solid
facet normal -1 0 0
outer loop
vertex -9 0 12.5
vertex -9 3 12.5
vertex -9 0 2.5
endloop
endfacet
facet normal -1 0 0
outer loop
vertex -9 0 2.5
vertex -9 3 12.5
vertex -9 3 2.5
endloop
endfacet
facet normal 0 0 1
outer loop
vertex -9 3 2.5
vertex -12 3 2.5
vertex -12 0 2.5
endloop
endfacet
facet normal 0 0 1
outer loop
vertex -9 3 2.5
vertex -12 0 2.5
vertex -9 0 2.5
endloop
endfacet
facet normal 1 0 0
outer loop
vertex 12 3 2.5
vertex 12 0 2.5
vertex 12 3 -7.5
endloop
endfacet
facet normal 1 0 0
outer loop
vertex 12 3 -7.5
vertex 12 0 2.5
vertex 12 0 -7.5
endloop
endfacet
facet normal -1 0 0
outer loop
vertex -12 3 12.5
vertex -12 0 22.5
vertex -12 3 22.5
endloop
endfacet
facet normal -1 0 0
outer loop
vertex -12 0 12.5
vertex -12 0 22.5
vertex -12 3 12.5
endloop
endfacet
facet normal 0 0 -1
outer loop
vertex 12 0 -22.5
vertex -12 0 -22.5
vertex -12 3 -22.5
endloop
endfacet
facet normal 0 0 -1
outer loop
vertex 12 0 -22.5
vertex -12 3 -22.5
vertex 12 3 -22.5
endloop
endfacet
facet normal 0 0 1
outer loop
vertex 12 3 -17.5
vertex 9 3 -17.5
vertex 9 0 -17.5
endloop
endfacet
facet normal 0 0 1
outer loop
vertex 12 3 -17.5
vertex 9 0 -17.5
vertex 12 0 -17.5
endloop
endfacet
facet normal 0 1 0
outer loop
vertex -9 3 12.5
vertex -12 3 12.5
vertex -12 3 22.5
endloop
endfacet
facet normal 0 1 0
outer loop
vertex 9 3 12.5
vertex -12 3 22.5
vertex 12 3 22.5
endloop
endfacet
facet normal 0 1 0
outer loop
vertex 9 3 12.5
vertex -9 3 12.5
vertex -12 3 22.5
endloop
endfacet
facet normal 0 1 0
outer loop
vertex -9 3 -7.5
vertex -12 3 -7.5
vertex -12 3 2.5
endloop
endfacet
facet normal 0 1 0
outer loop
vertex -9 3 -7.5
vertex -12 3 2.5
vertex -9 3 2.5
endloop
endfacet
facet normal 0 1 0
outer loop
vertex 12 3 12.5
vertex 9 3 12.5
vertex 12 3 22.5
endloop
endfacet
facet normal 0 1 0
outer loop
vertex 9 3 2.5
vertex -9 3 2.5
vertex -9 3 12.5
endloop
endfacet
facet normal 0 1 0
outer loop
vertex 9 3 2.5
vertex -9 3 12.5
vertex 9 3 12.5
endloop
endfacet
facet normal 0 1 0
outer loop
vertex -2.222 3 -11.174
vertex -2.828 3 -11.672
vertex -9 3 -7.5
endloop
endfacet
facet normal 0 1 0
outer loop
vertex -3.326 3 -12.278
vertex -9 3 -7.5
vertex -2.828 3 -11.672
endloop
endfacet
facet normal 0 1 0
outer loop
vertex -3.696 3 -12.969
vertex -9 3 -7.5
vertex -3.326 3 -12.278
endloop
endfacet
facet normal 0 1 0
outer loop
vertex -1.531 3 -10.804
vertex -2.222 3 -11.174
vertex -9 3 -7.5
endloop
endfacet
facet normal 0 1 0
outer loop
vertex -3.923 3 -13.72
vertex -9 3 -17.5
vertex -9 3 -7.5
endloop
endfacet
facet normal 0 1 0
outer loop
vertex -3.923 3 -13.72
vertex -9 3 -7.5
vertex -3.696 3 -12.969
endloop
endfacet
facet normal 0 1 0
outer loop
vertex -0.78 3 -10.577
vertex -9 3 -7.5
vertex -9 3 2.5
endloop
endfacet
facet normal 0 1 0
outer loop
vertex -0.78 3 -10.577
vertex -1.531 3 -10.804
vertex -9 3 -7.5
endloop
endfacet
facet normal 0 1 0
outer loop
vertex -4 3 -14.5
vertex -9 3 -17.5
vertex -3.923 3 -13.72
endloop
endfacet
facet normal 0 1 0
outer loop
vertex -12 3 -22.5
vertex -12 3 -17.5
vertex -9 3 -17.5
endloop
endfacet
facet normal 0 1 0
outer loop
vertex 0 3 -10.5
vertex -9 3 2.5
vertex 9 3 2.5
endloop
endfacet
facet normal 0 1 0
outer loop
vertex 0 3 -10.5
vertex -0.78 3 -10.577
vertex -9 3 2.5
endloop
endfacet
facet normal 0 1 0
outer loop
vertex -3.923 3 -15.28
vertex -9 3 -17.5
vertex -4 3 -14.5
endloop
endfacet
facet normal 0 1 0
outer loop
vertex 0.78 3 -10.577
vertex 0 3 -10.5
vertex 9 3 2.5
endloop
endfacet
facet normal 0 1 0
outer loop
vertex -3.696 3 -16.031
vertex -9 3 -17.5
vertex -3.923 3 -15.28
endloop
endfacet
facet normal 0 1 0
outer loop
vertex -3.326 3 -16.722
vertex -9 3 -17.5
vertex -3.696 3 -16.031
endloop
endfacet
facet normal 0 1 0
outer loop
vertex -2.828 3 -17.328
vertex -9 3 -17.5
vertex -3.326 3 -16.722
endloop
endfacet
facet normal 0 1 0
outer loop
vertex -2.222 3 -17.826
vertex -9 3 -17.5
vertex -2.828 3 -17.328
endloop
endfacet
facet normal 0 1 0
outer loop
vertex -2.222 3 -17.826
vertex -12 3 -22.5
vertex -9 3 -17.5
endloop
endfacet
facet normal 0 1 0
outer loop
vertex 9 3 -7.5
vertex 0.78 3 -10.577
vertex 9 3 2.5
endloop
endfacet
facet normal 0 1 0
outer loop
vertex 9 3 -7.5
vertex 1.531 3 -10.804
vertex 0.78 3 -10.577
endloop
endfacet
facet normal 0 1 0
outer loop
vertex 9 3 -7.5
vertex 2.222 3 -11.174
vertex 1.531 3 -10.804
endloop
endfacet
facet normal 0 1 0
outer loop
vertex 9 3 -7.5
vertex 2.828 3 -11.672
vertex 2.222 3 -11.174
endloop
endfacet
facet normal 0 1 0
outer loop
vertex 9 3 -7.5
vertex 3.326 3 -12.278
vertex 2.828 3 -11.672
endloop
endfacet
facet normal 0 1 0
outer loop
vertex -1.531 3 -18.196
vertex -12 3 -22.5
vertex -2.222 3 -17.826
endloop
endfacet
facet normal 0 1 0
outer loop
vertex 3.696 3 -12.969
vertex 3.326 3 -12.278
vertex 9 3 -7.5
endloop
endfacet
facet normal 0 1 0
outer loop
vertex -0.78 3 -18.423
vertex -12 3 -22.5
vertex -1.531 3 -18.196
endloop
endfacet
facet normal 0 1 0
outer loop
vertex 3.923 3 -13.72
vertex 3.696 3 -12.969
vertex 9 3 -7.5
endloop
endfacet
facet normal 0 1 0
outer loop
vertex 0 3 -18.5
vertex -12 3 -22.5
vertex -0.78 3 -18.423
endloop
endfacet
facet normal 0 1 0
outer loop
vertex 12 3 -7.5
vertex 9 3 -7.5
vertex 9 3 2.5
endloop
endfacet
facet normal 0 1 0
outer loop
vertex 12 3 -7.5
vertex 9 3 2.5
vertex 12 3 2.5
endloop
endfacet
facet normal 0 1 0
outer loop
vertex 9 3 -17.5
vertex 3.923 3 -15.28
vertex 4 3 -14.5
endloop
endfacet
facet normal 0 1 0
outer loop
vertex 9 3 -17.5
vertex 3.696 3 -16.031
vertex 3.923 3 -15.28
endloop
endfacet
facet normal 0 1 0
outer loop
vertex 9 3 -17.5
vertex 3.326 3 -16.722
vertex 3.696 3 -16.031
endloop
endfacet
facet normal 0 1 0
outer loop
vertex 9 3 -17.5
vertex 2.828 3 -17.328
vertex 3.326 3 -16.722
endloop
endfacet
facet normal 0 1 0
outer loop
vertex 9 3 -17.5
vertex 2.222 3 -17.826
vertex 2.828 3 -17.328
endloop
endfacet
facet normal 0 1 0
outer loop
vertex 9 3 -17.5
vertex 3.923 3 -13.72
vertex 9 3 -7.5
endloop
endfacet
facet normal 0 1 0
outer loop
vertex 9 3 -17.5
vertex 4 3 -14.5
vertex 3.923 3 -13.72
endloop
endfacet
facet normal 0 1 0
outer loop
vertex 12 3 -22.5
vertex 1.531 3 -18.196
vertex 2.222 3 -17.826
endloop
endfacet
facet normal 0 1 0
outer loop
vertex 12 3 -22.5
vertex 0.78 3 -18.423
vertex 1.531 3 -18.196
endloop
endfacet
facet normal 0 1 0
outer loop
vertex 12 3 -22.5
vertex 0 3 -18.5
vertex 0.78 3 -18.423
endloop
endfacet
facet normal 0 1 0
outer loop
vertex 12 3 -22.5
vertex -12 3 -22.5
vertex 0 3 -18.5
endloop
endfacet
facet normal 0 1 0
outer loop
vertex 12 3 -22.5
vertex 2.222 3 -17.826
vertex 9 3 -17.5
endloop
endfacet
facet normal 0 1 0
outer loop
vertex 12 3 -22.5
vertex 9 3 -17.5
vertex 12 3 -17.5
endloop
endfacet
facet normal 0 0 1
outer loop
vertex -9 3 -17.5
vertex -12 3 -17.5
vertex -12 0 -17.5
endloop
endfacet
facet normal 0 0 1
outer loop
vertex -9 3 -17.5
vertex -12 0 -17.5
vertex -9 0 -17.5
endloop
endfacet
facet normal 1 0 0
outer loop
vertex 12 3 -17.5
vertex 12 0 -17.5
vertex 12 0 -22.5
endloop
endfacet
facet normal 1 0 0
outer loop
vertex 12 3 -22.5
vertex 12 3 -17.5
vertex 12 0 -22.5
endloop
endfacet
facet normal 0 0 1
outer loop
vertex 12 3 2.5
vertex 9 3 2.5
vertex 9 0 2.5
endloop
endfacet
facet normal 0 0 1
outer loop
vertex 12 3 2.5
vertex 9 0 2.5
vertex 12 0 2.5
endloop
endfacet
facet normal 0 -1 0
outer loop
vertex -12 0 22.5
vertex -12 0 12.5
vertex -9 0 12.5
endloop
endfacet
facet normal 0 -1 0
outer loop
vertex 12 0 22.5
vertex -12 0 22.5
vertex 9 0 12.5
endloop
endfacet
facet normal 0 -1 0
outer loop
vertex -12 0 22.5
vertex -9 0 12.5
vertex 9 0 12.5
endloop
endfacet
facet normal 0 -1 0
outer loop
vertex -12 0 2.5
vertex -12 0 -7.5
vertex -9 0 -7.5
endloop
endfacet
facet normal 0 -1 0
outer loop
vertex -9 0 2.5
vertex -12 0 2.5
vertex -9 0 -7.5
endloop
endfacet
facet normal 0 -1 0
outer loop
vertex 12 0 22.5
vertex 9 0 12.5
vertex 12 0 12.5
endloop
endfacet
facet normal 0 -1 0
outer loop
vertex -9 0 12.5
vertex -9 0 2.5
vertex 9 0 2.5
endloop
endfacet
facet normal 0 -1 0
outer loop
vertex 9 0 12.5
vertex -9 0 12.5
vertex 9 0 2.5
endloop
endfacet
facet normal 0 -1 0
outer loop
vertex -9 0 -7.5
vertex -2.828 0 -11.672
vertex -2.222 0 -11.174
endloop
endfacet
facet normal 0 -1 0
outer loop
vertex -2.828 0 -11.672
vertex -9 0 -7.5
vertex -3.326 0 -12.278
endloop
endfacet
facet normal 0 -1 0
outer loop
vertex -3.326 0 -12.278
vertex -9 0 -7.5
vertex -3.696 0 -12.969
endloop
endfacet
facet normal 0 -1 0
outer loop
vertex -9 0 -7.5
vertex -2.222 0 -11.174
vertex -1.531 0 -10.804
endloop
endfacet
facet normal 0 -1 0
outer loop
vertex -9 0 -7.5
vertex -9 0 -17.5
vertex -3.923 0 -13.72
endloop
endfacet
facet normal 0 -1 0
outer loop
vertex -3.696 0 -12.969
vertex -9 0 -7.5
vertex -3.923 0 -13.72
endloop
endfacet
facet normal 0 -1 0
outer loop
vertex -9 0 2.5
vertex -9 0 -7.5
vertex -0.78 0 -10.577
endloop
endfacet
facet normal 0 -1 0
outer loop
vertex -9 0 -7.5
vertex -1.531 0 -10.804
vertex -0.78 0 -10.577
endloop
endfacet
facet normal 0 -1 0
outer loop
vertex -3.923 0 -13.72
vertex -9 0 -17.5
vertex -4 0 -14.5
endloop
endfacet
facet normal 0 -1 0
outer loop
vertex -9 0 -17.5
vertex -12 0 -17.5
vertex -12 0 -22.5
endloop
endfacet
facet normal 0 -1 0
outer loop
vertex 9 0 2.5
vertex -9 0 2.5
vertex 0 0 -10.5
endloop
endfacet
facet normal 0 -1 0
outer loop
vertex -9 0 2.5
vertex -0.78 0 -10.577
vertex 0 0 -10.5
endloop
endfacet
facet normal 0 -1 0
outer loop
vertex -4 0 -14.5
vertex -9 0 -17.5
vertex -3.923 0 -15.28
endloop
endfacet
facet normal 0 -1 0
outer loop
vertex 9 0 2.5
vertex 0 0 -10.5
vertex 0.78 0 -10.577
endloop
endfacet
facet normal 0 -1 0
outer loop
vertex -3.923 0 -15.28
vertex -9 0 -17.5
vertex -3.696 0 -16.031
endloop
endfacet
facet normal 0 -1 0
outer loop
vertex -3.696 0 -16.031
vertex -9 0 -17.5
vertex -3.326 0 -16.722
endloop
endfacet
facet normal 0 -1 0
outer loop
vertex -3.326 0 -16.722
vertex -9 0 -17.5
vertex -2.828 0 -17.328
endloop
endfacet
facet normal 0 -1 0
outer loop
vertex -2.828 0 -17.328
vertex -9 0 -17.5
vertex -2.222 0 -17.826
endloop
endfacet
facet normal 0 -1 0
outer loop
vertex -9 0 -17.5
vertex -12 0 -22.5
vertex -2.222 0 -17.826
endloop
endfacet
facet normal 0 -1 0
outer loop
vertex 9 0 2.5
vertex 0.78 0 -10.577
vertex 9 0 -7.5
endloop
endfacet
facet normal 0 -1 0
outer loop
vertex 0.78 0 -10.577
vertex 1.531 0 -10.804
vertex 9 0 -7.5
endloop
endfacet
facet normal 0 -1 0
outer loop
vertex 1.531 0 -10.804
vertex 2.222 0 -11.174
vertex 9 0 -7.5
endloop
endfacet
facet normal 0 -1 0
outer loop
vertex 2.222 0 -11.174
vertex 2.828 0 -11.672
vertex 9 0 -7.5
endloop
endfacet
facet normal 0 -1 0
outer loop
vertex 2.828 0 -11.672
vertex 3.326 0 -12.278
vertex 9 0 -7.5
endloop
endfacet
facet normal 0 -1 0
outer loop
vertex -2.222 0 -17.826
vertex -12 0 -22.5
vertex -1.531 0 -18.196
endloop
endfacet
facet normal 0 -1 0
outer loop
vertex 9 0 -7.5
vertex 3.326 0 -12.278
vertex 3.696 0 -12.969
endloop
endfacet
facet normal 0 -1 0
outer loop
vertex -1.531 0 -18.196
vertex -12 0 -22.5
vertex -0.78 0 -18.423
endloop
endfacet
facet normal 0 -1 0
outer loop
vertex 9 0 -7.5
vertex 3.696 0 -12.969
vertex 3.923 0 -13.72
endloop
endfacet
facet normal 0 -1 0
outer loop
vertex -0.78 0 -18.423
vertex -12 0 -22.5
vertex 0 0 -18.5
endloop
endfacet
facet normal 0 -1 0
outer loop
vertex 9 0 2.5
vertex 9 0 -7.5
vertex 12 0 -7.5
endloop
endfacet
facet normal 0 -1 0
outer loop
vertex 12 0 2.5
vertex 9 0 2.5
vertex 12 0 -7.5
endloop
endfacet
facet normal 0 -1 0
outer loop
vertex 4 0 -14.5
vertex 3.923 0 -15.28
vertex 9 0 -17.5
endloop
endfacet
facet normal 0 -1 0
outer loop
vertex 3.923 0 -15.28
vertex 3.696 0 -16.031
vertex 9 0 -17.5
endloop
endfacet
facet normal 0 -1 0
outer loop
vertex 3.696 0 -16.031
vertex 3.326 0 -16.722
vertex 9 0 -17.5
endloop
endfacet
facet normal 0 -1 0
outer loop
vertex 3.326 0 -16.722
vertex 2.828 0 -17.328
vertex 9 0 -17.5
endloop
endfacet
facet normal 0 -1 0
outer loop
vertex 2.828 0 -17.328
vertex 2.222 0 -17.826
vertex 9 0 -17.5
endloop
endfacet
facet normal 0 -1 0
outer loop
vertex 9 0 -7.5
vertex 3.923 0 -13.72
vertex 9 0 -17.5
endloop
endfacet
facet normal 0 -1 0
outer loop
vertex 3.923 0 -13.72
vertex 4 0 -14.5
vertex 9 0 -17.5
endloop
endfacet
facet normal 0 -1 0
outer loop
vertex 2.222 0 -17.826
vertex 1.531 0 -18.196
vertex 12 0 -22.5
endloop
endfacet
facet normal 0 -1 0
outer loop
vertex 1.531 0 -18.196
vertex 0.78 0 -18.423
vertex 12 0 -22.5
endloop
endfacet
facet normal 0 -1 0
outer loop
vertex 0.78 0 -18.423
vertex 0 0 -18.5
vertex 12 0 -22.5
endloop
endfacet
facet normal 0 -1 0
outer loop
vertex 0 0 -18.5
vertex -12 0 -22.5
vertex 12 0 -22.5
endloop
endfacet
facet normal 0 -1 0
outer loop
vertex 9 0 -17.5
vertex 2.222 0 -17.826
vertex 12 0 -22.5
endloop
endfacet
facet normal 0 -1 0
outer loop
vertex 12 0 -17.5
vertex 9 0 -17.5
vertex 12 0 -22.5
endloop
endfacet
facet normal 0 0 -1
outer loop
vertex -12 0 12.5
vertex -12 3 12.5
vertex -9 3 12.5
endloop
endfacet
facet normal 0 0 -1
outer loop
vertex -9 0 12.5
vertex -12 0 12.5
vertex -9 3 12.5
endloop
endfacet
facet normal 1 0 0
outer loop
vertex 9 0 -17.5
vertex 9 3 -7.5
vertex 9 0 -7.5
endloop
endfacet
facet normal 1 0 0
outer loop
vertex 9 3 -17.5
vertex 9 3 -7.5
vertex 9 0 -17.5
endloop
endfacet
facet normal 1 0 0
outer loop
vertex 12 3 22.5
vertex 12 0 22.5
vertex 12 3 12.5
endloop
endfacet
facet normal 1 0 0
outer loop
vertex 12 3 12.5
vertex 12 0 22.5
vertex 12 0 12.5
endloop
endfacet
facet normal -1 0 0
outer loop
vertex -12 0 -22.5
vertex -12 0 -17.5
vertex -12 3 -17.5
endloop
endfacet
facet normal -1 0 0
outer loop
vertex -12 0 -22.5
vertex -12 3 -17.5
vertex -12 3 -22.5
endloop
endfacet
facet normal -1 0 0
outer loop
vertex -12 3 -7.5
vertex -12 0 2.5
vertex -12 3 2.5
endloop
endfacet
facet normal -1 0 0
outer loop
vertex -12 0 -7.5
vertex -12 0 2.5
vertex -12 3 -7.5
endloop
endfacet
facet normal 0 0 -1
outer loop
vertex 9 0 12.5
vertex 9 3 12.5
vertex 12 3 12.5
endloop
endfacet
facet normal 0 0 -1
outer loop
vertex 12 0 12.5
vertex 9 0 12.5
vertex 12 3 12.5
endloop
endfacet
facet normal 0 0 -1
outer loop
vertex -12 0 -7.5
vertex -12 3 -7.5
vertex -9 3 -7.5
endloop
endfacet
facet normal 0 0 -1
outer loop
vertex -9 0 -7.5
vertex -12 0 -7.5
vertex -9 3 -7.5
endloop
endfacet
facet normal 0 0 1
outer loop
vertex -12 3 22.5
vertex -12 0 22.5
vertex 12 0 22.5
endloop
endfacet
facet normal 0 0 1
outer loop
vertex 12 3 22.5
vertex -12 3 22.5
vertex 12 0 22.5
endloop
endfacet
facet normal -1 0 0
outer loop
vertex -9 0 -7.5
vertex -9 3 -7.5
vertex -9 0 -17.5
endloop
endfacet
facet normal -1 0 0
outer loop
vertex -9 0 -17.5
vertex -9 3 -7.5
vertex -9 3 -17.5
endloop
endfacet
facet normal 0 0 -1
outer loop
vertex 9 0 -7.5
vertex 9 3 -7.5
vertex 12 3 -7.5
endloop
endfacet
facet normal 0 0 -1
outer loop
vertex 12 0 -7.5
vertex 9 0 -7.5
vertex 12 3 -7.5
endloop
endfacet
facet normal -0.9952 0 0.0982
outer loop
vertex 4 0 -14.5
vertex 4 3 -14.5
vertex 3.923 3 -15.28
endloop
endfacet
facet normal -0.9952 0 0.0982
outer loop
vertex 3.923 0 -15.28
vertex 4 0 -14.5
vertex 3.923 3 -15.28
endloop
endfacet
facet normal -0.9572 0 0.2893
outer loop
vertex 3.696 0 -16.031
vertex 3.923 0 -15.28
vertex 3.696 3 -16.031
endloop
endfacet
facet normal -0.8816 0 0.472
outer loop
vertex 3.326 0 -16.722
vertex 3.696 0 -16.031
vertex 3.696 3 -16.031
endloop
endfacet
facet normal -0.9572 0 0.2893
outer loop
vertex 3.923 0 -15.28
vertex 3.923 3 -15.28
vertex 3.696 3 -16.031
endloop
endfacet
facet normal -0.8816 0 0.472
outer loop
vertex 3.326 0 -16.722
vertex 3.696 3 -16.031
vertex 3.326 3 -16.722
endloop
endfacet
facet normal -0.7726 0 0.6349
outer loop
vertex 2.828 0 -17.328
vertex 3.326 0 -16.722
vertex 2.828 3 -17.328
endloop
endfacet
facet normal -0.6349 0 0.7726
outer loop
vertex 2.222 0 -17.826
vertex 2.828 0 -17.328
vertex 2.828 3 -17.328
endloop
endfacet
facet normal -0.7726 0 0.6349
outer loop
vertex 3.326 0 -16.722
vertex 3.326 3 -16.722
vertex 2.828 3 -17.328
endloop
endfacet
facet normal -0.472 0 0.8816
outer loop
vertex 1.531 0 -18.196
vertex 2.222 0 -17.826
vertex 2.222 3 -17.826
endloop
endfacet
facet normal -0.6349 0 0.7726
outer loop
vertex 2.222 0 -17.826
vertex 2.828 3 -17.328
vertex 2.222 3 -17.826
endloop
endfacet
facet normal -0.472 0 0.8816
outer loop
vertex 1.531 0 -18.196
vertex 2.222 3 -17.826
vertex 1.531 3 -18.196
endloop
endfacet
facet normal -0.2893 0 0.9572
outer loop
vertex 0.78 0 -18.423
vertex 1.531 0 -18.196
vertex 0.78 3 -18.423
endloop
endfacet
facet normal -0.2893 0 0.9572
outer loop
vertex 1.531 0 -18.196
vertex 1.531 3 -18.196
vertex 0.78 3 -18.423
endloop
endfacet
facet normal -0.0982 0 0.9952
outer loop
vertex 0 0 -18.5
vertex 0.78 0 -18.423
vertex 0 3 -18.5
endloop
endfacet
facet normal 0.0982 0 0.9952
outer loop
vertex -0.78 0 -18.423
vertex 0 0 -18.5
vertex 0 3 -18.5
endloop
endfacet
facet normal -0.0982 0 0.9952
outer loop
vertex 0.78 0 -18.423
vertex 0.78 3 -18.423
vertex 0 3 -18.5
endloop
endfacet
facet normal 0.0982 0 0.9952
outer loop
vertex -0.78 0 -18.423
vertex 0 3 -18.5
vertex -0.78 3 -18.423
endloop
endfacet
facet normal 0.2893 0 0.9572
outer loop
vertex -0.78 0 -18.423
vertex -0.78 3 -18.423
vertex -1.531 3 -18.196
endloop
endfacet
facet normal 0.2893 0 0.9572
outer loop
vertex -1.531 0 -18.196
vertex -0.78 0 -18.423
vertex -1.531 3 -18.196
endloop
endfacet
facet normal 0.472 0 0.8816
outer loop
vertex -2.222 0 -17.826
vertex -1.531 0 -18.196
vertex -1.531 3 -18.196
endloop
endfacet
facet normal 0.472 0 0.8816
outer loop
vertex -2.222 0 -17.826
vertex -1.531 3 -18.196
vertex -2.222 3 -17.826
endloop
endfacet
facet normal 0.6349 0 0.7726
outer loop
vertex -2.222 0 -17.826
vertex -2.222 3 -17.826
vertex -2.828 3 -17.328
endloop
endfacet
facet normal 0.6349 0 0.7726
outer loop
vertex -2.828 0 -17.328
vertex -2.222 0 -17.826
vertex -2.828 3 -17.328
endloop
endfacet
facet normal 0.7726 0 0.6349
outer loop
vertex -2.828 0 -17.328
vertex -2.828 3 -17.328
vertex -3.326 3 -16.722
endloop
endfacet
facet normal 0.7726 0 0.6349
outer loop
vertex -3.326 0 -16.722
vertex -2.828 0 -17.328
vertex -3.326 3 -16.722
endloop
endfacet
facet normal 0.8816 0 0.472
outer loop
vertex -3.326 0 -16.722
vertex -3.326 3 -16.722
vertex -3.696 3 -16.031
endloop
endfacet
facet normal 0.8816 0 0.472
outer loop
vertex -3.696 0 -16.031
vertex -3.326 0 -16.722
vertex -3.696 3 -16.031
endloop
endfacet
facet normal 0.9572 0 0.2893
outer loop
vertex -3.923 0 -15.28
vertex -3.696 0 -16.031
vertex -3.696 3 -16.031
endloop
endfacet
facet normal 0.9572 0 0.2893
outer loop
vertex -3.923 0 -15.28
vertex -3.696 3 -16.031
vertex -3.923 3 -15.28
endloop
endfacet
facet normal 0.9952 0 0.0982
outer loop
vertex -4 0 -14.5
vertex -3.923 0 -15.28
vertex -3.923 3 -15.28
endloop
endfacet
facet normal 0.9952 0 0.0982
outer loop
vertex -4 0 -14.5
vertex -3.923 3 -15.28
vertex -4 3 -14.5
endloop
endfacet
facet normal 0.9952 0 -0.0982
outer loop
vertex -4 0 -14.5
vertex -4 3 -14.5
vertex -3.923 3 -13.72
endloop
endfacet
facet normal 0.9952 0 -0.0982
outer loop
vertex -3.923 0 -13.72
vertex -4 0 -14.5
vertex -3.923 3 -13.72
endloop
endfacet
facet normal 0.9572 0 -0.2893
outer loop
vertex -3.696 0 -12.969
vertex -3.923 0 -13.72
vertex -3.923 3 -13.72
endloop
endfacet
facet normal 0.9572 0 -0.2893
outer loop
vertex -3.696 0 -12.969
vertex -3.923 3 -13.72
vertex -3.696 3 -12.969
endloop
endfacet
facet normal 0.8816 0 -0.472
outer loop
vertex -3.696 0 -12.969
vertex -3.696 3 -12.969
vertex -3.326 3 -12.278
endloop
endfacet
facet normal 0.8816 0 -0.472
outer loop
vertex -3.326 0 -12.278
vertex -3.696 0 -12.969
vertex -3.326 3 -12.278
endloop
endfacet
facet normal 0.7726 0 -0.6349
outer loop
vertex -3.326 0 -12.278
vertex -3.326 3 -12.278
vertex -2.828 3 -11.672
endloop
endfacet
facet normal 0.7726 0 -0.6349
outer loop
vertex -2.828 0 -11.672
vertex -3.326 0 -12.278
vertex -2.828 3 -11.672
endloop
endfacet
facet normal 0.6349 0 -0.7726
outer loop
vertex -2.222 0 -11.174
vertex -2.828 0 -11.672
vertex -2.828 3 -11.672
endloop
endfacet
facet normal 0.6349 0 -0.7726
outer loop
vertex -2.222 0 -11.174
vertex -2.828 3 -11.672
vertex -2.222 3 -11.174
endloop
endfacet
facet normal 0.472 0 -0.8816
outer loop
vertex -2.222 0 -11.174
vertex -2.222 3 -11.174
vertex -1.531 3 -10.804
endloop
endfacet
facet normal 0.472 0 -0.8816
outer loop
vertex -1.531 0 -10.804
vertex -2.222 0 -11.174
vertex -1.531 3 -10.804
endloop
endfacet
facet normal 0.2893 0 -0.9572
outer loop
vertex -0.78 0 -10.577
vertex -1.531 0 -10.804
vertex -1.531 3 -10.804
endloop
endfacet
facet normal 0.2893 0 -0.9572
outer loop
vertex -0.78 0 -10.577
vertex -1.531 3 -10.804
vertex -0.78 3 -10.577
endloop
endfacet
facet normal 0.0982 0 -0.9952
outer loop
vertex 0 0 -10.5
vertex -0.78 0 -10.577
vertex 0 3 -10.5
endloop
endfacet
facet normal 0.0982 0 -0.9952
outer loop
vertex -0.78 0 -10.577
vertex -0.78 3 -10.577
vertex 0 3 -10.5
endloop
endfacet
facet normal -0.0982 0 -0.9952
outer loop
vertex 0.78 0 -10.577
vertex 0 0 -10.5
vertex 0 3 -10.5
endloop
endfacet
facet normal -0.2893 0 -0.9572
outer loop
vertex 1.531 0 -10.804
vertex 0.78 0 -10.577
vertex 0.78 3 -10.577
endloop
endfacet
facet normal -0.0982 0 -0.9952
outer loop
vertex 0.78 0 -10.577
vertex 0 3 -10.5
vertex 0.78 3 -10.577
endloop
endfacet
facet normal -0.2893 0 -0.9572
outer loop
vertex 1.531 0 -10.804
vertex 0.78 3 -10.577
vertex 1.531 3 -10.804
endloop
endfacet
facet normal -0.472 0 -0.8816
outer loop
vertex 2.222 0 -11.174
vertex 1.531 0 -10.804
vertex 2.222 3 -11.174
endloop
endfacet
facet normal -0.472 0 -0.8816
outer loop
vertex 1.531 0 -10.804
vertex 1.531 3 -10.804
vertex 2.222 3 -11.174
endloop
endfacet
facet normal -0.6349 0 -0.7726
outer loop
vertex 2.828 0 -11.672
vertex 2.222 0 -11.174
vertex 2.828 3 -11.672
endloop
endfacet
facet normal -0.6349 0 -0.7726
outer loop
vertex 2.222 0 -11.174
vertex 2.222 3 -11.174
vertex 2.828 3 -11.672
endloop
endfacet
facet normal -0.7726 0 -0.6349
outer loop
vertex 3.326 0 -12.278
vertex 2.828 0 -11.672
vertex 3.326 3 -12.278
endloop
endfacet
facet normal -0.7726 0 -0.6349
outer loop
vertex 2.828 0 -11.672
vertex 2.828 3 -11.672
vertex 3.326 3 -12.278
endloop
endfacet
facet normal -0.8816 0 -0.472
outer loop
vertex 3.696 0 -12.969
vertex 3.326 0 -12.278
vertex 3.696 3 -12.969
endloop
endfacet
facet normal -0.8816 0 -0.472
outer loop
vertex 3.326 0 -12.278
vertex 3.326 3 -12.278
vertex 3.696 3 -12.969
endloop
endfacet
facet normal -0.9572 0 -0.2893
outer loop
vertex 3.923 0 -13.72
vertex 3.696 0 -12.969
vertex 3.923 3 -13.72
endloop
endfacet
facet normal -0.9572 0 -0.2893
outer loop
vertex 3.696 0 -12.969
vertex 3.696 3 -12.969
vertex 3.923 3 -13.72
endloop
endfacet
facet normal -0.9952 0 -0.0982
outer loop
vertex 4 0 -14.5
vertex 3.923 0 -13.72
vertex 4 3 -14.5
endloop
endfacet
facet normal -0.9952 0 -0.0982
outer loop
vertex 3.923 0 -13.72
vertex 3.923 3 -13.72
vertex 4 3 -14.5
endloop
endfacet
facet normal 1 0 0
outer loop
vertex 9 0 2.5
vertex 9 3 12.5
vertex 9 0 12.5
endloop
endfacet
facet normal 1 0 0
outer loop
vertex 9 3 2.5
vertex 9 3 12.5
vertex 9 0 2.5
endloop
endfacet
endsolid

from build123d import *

# Parameters (mm, degrees)
SKETCH1_W           = 24
SKETCH1_H           = 45
BOSS_EXTRUDE1_DEPTH = 3
SKETCH4_R           = 4
SKETCH4_W           = 3
SKETCH4_H           = 10
CUT_EXTRUDE1_DEPTH  = 4


with BuildPart() as part:
    # Sketch1 → Boss-Extrude1 (new body)
    with BuildSketch(Plane(origin=(0, 0, 0), x_dir=(1, 0, 0), z_dir=(0, 1, 0))):
        Rectangle(SKETCH1_W, SKETCH1_H)
    extrude(amount=BOSS_EXTRUDE1_DEPTH)

    # Sketch4 → Cut-Extrude1 (cut, through all)
    with BuildSketch(Plane(origin=(0, 3, 0), x_dir=(1, 0, 0), z_dir=(0, 1, 0))):
        with Locations((0, 14.5)):
            Circle(SKETCH4_R)
        with Locations((-10.5, -7.5)):
            Rectangle(SKETCH4_W, SKETCH4_H)
        with Locations((-10.5, 12.5)):
            Rectangle(SKETCH4_W, SKETCH4_H)
        with Locations((10.5, 12.5)):
            Rectangle(SKETCH4_W, SKETCH4_H)
        with Locations((10.5, -7.5)):
            Rectangle(SKETCH4_W, SKETCH4_H)
    extrude(amount=-CUT_EXTRUDE1_DEPTH, mode=Mode.SUBTRACT)


solid = part.part
